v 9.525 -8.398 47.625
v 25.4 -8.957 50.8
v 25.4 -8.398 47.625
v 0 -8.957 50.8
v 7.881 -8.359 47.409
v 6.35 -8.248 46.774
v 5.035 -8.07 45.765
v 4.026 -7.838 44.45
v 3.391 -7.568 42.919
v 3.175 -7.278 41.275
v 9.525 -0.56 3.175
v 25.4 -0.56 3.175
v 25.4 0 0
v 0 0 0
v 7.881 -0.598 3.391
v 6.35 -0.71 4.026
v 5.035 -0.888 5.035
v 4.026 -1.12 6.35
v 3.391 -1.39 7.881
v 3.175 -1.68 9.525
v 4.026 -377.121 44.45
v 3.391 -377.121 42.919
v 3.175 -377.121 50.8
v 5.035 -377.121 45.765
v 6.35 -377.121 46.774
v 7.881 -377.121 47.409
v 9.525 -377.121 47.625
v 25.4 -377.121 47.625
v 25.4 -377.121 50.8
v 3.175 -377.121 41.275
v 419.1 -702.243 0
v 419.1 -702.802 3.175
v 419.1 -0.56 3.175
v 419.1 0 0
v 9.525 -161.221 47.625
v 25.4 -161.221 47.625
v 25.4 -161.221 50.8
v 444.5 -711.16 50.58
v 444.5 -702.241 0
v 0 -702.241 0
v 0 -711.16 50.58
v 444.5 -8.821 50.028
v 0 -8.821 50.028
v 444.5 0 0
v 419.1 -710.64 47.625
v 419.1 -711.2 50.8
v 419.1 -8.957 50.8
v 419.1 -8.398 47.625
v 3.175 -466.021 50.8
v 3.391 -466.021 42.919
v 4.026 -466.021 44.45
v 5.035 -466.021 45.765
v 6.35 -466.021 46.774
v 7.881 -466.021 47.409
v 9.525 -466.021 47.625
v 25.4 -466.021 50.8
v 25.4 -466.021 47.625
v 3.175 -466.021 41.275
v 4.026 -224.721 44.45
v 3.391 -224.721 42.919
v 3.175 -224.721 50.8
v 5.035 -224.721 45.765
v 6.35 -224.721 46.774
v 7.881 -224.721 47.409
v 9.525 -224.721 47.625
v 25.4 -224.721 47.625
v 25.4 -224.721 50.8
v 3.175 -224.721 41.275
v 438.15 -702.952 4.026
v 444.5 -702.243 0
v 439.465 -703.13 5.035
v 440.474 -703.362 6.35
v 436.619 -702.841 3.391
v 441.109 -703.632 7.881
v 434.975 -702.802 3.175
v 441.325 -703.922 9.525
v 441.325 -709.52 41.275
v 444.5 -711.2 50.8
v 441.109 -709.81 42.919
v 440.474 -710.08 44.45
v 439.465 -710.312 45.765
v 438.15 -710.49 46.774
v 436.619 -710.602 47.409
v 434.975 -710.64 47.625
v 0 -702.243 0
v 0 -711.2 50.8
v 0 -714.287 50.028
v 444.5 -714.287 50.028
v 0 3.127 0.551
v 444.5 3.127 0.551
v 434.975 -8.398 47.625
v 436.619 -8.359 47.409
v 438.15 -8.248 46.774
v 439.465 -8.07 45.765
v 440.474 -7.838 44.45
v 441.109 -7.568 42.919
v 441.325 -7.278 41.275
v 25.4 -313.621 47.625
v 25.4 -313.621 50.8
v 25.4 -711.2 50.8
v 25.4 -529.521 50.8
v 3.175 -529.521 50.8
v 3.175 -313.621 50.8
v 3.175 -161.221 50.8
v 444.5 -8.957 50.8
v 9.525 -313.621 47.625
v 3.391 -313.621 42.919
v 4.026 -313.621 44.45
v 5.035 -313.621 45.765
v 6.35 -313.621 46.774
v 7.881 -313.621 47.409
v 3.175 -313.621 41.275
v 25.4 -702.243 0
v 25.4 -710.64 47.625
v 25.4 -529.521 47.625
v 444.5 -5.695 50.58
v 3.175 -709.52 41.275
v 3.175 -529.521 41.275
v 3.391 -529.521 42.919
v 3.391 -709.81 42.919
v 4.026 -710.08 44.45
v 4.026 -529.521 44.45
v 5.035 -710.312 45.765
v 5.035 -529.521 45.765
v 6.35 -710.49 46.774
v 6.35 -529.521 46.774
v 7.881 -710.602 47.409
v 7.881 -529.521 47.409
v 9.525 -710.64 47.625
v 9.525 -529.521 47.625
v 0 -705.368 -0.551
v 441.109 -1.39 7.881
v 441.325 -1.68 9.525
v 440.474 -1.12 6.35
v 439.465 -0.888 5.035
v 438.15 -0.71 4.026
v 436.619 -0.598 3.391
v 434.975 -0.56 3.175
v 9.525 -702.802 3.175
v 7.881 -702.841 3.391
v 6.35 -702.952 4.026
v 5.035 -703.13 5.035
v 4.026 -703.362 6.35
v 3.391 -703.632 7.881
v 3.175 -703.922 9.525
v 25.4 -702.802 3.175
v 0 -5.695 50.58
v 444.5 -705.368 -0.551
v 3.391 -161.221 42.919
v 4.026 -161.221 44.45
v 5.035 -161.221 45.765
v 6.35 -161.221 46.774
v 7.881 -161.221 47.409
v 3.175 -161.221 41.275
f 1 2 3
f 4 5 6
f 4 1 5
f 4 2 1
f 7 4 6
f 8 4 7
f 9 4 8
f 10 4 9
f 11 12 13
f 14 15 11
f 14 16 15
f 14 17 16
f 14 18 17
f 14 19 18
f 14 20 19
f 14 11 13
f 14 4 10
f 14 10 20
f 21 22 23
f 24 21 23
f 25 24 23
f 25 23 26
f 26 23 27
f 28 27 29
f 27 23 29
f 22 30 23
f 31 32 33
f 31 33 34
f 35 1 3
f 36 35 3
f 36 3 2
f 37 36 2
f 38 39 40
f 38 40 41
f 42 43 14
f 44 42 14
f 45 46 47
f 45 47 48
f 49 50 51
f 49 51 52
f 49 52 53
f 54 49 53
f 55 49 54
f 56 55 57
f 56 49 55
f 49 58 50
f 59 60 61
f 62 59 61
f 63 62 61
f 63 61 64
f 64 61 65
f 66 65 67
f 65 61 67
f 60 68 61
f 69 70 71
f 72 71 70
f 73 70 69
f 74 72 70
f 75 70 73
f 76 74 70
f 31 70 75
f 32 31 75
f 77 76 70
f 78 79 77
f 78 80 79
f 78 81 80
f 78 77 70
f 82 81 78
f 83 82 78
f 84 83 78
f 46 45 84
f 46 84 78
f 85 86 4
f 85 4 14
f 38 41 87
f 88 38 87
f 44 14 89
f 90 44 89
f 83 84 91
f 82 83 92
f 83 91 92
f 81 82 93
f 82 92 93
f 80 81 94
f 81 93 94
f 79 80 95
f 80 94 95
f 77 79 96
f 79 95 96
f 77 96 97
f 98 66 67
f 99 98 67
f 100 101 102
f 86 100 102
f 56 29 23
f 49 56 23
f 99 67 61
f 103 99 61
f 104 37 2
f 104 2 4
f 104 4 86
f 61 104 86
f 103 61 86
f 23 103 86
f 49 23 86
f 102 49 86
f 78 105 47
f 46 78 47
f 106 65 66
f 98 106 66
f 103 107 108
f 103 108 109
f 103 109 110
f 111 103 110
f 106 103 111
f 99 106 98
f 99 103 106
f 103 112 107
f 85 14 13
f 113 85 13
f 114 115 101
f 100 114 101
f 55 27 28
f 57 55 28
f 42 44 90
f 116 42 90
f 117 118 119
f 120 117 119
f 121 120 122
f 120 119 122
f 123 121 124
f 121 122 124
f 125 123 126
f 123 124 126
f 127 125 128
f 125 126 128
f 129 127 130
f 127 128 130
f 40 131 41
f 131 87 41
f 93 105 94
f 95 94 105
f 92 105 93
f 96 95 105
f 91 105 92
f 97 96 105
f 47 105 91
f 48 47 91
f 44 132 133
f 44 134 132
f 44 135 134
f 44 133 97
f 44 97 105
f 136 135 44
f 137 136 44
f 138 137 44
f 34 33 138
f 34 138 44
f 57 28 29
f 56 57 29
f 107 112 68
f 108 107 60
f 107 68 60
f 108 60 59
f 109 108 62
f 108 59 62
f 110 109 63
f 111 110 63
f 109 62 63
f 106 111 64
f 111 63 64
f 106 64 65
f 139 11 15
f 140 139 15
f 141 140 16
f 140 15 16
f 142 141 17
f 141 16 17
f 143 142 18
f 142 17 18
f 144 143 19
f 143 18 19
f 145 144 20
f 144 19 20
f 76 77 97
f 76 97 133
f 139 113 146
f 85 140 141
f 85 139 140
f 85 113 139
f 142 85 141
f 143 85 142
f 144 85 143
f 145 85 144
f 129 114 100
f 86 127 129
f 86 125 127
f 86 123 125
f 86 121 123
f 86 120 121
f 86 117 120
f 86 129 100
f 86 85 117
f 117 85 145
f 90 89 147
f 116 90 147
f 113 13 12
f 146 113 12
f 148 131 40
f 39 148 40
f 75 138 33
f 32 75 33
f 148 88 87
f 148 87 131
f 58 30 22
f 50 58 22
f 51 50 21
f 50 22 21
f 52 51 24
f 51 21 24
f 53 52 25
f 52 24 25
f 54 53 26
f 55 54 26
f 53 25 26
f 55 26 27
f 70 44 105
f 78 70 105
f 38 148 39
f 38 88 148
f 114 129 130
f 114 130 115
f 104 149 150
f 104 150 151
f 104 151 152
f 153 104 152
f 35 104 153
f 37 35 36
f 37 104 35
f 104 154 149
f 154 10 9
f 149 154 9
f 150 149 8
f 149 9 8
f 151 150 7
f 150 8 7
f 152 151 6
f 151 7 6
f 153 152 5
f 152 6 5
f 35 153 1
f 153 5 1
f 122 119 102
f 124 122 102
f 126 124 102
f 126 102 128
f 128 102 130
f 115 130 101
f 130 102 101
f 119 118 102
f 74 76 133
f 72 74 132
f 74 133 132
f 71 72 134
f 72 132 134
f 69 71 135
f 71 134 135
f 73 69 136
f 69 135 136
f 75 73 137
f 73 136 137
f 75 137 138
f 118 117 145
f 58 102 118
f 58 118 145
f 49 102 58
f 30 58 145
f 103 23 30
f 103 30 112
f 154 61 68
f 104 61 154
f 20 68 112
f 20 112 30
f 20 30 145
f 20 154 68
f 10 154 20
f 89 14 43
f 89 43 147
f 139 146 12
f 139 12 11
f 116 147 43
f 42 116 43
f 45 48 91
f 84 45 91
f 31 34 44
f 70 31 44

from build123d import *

# Parameters (mm, degrees)
F1_DEPTH = 711.2
F3_DEPTH = 444.501
F5_DEPTH = 444.5
F6_W     = 22.225
F6_H     = 63.5
F7_DEPTH = 25.4


with BuildPart() as f1:
    # F0 (on Front) → F1 (new body)
    with BuildSketch(Plane.XZ):
        with BuildLine():
            Line((25.4, 47.625), (25.4, 50.8))
            Line((25.4, 50.8), (0, 50.8))
            Line((0, 50.8), (0, 0))
            Line((0, 0), (25.4, 0))
            Line((25.4, 0), (25.4, 3.175))
            Line((25.4, 3.175), (9.525, 3.175))
            ThreePointArc((9.525, 3.175), (5.034872, 5.034872), (3.175, 9.525))
            Line((3.175, 9.525), (3.175, 41.275))
            ThreePointArc((3.175, 41.275), (5.034872, 45.765128), (9.525, 47.625))
            Line((9.525, 47.625), (25.4, 47.625))
        make_face()
        with BuildLine():
            Line((444.5, 50.8), (419.1, 50.8))
            Line((419.1, 50.8), (419.1, 47.625))
            Line((419.1, 47.625), (434.975, 47.625))
            ThreePointArc((434.975, 47.625), (439.465128, 45.765128), (441.325, 41.275))
            Line((441.325, 41.275), (441.325, 9.525))
            ThreePointArc((441.325, 9.525), (439.465128, 5.034872), (434.975, 3.175))
            Line((434.975, 3.175), (419.1, 3.175))
            Line((419.1, 3.175), (419.1, 0))
            Line((419.1, 0), (444.5, 0))
            Line((444.5, 0), (444.5, 50.8))
        make_face()
    extrude(amount=F1_DEPTH)

    # F2 (on Right) → F3 (cut, through all)
    with BuildSketch(Plane.YZ):
        Polygon((-8.957411, 50.8), (0, 0), (0, 50.8), align=None)
        Polygon((-711.2, 0), (-702.242589, 0), (-711.2, 50.8), align=None)
    extrude(amount=F3_DEPTH, mode=Mode.SUBTRACT)

    # F6 (on face) → F7 (cut)
    with BuildSketch(Plane.XY.offset(50.8)):
        with Locations((14.2875, -192.971327)):
            Rectangle(F6_W, F6_H)
        with Locations((14.2875, -345.371327)):
            Rectangle(F6_W, F6_H)
        with Locations((14.2875, -497.771327)):
            Rectangle(F6_W, F6_H)
    extrude(amount=-F7_DEPTH, mode=Mode.SUBTRACT)


with BuildPart() as f5:
    # F4 (on Right) → F5 (new body)
    with BuildSketch(Plane.YZ):
        Polygon((-8.821327, 50.028234), (0, 0), (3.126765, 0.551333), (-5.694563, 50.579567), align=None)
        Polygon((-705.368185, -0.551333), (-702.24142, 0), (-711.159962, 50.579567), (-714.286727, 50.028234), align=None)
    extrude(amount=F5_DEPTH)


solid = Compound([f1.part, f5.part])
